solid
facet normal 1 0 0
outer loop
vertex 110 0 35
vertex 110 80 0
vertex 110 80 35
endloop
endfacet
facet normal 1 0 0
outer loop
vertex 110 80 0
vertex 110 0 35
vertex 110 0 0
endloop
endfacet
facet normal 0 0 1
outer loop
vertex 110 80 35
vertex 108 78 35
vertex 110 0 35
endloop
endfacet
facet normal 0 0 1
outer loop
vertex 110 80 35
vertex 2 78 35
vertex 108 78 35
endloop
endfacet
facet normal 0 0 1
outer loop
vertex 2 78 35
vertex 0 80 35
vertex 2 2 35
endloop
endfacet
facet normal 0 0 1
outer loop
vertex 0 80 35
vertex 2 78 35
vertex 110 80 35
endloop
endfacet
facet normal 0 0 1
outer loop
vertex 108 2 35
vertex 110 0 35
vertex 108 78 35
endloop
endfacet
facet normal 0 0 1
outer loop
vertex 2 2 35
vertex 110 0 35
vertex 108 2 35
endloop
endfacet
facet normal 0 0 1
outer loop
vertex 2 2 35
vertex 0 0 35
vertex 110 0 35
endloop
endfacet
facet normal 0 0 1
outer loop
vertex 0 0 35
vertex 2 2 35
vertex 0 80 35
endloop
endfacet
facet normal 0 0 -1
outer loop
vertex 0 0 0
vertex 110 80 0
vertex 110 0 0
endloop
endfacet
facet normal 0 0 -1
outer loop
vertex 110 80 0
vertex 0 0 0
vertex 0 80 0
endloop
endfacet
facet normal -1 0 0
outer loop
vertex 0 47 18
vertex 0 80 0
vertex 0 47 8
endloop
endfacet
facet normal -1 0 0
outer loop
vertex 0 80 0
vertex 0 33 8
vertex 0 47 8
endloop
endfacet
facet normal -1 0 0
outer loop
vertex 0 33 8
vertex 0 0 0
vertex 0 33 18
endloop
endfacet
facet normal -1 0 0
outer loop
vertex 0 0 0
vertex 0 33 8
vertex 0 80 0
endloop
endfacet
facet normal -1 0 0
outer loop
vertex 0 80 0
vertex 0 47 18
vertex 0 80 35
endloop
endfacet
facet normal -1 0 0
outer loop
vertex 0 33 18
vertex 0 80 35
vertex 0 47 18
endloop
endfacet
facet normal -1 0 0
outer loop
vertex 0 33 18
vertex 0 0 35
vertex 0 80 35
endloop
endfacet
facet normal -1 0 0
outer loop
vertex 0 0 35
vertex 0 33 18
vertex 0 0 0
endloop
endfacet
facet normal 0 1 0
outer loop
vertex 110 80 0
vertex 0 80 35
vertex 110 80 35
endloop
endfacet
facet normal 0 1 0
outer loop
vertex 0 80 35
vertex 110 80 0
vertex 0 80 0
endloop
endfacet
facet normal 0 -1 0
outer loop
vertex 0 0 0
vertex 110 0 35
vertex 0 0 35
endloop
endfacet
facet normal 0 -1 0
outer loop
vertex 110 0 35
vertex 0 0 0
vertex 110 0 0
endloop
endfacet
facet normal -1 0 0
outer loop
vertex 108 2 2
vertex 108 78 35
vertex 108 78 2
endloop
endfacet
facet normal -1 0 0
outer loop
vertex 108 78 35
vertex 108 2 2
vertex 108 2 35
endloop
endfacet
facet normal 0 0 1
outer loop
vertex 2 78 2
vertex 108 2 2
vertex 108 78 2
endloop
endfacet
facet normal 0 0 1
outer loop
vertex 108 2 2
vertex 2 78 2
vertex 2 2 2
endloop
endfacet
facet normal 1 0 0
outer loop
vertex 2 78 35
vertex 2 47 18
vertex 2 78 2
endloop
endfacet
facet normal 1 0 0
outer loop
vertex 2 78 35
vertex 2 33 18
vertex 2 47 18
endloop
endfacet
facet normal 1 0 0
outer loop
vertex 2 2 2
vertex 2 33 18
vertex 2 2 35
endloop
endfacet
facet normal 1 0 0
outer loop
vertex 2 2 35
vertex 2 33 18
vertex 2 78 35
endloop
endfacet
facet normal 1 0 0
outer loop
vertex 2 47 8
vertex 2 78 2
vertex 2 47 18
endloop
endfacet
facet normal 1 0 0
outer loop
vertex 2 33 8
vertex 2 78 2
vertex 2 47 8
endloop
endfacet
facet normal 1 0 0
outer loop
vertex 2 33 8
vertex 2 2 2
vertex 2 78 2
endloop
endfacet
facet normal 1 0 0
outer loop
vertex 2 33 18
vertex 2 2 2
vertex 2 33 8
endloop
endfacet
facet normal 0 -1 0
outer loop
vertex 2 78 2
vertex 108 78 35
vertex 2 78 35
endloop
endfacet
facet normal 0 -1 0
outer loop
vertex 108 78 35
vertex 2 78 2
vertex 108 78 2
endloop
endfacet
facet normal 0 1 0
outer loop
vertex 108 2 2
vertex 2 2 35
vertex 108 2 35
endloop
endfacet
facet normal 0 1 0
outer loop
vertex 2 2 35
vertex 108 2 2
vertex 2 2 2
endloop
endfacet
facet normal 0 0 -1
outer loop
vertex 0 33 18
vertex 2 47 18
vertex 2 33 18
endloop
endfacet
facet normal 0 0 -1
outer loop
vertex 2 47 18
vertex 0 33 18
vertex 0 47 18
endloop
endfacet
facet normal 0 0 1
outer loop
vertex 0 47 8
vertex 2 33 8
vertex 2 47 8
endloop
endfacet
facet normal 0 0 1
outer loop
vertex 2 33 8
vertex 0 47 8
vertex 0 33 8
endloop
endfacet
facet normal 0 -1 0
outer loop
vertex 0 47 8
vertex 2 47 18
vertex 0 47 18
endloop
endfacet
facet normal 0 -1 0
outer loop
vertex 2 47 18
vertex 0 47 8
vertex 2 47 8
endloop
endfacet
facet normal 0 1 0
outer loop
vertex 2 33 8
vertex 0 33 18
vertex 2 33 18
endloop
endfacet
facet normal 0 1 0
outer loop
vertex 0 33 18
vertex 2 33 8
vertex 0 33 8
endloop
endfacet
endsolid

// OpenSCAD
L = 110;
W = 80;
H = 35;
wall = 2;
floor_t = 2;
difference() {
  cube([L,W,H]);
  translate([wall,wall,floor_t]) cube([L-2*wall,W-2*wall,H]);
  // Pemotong melampaui kedua permukaan wall agar bukaan tembus.
  translate([-0.1,W/2-7,8]) cube([wall+0.2,14,10]);
}
